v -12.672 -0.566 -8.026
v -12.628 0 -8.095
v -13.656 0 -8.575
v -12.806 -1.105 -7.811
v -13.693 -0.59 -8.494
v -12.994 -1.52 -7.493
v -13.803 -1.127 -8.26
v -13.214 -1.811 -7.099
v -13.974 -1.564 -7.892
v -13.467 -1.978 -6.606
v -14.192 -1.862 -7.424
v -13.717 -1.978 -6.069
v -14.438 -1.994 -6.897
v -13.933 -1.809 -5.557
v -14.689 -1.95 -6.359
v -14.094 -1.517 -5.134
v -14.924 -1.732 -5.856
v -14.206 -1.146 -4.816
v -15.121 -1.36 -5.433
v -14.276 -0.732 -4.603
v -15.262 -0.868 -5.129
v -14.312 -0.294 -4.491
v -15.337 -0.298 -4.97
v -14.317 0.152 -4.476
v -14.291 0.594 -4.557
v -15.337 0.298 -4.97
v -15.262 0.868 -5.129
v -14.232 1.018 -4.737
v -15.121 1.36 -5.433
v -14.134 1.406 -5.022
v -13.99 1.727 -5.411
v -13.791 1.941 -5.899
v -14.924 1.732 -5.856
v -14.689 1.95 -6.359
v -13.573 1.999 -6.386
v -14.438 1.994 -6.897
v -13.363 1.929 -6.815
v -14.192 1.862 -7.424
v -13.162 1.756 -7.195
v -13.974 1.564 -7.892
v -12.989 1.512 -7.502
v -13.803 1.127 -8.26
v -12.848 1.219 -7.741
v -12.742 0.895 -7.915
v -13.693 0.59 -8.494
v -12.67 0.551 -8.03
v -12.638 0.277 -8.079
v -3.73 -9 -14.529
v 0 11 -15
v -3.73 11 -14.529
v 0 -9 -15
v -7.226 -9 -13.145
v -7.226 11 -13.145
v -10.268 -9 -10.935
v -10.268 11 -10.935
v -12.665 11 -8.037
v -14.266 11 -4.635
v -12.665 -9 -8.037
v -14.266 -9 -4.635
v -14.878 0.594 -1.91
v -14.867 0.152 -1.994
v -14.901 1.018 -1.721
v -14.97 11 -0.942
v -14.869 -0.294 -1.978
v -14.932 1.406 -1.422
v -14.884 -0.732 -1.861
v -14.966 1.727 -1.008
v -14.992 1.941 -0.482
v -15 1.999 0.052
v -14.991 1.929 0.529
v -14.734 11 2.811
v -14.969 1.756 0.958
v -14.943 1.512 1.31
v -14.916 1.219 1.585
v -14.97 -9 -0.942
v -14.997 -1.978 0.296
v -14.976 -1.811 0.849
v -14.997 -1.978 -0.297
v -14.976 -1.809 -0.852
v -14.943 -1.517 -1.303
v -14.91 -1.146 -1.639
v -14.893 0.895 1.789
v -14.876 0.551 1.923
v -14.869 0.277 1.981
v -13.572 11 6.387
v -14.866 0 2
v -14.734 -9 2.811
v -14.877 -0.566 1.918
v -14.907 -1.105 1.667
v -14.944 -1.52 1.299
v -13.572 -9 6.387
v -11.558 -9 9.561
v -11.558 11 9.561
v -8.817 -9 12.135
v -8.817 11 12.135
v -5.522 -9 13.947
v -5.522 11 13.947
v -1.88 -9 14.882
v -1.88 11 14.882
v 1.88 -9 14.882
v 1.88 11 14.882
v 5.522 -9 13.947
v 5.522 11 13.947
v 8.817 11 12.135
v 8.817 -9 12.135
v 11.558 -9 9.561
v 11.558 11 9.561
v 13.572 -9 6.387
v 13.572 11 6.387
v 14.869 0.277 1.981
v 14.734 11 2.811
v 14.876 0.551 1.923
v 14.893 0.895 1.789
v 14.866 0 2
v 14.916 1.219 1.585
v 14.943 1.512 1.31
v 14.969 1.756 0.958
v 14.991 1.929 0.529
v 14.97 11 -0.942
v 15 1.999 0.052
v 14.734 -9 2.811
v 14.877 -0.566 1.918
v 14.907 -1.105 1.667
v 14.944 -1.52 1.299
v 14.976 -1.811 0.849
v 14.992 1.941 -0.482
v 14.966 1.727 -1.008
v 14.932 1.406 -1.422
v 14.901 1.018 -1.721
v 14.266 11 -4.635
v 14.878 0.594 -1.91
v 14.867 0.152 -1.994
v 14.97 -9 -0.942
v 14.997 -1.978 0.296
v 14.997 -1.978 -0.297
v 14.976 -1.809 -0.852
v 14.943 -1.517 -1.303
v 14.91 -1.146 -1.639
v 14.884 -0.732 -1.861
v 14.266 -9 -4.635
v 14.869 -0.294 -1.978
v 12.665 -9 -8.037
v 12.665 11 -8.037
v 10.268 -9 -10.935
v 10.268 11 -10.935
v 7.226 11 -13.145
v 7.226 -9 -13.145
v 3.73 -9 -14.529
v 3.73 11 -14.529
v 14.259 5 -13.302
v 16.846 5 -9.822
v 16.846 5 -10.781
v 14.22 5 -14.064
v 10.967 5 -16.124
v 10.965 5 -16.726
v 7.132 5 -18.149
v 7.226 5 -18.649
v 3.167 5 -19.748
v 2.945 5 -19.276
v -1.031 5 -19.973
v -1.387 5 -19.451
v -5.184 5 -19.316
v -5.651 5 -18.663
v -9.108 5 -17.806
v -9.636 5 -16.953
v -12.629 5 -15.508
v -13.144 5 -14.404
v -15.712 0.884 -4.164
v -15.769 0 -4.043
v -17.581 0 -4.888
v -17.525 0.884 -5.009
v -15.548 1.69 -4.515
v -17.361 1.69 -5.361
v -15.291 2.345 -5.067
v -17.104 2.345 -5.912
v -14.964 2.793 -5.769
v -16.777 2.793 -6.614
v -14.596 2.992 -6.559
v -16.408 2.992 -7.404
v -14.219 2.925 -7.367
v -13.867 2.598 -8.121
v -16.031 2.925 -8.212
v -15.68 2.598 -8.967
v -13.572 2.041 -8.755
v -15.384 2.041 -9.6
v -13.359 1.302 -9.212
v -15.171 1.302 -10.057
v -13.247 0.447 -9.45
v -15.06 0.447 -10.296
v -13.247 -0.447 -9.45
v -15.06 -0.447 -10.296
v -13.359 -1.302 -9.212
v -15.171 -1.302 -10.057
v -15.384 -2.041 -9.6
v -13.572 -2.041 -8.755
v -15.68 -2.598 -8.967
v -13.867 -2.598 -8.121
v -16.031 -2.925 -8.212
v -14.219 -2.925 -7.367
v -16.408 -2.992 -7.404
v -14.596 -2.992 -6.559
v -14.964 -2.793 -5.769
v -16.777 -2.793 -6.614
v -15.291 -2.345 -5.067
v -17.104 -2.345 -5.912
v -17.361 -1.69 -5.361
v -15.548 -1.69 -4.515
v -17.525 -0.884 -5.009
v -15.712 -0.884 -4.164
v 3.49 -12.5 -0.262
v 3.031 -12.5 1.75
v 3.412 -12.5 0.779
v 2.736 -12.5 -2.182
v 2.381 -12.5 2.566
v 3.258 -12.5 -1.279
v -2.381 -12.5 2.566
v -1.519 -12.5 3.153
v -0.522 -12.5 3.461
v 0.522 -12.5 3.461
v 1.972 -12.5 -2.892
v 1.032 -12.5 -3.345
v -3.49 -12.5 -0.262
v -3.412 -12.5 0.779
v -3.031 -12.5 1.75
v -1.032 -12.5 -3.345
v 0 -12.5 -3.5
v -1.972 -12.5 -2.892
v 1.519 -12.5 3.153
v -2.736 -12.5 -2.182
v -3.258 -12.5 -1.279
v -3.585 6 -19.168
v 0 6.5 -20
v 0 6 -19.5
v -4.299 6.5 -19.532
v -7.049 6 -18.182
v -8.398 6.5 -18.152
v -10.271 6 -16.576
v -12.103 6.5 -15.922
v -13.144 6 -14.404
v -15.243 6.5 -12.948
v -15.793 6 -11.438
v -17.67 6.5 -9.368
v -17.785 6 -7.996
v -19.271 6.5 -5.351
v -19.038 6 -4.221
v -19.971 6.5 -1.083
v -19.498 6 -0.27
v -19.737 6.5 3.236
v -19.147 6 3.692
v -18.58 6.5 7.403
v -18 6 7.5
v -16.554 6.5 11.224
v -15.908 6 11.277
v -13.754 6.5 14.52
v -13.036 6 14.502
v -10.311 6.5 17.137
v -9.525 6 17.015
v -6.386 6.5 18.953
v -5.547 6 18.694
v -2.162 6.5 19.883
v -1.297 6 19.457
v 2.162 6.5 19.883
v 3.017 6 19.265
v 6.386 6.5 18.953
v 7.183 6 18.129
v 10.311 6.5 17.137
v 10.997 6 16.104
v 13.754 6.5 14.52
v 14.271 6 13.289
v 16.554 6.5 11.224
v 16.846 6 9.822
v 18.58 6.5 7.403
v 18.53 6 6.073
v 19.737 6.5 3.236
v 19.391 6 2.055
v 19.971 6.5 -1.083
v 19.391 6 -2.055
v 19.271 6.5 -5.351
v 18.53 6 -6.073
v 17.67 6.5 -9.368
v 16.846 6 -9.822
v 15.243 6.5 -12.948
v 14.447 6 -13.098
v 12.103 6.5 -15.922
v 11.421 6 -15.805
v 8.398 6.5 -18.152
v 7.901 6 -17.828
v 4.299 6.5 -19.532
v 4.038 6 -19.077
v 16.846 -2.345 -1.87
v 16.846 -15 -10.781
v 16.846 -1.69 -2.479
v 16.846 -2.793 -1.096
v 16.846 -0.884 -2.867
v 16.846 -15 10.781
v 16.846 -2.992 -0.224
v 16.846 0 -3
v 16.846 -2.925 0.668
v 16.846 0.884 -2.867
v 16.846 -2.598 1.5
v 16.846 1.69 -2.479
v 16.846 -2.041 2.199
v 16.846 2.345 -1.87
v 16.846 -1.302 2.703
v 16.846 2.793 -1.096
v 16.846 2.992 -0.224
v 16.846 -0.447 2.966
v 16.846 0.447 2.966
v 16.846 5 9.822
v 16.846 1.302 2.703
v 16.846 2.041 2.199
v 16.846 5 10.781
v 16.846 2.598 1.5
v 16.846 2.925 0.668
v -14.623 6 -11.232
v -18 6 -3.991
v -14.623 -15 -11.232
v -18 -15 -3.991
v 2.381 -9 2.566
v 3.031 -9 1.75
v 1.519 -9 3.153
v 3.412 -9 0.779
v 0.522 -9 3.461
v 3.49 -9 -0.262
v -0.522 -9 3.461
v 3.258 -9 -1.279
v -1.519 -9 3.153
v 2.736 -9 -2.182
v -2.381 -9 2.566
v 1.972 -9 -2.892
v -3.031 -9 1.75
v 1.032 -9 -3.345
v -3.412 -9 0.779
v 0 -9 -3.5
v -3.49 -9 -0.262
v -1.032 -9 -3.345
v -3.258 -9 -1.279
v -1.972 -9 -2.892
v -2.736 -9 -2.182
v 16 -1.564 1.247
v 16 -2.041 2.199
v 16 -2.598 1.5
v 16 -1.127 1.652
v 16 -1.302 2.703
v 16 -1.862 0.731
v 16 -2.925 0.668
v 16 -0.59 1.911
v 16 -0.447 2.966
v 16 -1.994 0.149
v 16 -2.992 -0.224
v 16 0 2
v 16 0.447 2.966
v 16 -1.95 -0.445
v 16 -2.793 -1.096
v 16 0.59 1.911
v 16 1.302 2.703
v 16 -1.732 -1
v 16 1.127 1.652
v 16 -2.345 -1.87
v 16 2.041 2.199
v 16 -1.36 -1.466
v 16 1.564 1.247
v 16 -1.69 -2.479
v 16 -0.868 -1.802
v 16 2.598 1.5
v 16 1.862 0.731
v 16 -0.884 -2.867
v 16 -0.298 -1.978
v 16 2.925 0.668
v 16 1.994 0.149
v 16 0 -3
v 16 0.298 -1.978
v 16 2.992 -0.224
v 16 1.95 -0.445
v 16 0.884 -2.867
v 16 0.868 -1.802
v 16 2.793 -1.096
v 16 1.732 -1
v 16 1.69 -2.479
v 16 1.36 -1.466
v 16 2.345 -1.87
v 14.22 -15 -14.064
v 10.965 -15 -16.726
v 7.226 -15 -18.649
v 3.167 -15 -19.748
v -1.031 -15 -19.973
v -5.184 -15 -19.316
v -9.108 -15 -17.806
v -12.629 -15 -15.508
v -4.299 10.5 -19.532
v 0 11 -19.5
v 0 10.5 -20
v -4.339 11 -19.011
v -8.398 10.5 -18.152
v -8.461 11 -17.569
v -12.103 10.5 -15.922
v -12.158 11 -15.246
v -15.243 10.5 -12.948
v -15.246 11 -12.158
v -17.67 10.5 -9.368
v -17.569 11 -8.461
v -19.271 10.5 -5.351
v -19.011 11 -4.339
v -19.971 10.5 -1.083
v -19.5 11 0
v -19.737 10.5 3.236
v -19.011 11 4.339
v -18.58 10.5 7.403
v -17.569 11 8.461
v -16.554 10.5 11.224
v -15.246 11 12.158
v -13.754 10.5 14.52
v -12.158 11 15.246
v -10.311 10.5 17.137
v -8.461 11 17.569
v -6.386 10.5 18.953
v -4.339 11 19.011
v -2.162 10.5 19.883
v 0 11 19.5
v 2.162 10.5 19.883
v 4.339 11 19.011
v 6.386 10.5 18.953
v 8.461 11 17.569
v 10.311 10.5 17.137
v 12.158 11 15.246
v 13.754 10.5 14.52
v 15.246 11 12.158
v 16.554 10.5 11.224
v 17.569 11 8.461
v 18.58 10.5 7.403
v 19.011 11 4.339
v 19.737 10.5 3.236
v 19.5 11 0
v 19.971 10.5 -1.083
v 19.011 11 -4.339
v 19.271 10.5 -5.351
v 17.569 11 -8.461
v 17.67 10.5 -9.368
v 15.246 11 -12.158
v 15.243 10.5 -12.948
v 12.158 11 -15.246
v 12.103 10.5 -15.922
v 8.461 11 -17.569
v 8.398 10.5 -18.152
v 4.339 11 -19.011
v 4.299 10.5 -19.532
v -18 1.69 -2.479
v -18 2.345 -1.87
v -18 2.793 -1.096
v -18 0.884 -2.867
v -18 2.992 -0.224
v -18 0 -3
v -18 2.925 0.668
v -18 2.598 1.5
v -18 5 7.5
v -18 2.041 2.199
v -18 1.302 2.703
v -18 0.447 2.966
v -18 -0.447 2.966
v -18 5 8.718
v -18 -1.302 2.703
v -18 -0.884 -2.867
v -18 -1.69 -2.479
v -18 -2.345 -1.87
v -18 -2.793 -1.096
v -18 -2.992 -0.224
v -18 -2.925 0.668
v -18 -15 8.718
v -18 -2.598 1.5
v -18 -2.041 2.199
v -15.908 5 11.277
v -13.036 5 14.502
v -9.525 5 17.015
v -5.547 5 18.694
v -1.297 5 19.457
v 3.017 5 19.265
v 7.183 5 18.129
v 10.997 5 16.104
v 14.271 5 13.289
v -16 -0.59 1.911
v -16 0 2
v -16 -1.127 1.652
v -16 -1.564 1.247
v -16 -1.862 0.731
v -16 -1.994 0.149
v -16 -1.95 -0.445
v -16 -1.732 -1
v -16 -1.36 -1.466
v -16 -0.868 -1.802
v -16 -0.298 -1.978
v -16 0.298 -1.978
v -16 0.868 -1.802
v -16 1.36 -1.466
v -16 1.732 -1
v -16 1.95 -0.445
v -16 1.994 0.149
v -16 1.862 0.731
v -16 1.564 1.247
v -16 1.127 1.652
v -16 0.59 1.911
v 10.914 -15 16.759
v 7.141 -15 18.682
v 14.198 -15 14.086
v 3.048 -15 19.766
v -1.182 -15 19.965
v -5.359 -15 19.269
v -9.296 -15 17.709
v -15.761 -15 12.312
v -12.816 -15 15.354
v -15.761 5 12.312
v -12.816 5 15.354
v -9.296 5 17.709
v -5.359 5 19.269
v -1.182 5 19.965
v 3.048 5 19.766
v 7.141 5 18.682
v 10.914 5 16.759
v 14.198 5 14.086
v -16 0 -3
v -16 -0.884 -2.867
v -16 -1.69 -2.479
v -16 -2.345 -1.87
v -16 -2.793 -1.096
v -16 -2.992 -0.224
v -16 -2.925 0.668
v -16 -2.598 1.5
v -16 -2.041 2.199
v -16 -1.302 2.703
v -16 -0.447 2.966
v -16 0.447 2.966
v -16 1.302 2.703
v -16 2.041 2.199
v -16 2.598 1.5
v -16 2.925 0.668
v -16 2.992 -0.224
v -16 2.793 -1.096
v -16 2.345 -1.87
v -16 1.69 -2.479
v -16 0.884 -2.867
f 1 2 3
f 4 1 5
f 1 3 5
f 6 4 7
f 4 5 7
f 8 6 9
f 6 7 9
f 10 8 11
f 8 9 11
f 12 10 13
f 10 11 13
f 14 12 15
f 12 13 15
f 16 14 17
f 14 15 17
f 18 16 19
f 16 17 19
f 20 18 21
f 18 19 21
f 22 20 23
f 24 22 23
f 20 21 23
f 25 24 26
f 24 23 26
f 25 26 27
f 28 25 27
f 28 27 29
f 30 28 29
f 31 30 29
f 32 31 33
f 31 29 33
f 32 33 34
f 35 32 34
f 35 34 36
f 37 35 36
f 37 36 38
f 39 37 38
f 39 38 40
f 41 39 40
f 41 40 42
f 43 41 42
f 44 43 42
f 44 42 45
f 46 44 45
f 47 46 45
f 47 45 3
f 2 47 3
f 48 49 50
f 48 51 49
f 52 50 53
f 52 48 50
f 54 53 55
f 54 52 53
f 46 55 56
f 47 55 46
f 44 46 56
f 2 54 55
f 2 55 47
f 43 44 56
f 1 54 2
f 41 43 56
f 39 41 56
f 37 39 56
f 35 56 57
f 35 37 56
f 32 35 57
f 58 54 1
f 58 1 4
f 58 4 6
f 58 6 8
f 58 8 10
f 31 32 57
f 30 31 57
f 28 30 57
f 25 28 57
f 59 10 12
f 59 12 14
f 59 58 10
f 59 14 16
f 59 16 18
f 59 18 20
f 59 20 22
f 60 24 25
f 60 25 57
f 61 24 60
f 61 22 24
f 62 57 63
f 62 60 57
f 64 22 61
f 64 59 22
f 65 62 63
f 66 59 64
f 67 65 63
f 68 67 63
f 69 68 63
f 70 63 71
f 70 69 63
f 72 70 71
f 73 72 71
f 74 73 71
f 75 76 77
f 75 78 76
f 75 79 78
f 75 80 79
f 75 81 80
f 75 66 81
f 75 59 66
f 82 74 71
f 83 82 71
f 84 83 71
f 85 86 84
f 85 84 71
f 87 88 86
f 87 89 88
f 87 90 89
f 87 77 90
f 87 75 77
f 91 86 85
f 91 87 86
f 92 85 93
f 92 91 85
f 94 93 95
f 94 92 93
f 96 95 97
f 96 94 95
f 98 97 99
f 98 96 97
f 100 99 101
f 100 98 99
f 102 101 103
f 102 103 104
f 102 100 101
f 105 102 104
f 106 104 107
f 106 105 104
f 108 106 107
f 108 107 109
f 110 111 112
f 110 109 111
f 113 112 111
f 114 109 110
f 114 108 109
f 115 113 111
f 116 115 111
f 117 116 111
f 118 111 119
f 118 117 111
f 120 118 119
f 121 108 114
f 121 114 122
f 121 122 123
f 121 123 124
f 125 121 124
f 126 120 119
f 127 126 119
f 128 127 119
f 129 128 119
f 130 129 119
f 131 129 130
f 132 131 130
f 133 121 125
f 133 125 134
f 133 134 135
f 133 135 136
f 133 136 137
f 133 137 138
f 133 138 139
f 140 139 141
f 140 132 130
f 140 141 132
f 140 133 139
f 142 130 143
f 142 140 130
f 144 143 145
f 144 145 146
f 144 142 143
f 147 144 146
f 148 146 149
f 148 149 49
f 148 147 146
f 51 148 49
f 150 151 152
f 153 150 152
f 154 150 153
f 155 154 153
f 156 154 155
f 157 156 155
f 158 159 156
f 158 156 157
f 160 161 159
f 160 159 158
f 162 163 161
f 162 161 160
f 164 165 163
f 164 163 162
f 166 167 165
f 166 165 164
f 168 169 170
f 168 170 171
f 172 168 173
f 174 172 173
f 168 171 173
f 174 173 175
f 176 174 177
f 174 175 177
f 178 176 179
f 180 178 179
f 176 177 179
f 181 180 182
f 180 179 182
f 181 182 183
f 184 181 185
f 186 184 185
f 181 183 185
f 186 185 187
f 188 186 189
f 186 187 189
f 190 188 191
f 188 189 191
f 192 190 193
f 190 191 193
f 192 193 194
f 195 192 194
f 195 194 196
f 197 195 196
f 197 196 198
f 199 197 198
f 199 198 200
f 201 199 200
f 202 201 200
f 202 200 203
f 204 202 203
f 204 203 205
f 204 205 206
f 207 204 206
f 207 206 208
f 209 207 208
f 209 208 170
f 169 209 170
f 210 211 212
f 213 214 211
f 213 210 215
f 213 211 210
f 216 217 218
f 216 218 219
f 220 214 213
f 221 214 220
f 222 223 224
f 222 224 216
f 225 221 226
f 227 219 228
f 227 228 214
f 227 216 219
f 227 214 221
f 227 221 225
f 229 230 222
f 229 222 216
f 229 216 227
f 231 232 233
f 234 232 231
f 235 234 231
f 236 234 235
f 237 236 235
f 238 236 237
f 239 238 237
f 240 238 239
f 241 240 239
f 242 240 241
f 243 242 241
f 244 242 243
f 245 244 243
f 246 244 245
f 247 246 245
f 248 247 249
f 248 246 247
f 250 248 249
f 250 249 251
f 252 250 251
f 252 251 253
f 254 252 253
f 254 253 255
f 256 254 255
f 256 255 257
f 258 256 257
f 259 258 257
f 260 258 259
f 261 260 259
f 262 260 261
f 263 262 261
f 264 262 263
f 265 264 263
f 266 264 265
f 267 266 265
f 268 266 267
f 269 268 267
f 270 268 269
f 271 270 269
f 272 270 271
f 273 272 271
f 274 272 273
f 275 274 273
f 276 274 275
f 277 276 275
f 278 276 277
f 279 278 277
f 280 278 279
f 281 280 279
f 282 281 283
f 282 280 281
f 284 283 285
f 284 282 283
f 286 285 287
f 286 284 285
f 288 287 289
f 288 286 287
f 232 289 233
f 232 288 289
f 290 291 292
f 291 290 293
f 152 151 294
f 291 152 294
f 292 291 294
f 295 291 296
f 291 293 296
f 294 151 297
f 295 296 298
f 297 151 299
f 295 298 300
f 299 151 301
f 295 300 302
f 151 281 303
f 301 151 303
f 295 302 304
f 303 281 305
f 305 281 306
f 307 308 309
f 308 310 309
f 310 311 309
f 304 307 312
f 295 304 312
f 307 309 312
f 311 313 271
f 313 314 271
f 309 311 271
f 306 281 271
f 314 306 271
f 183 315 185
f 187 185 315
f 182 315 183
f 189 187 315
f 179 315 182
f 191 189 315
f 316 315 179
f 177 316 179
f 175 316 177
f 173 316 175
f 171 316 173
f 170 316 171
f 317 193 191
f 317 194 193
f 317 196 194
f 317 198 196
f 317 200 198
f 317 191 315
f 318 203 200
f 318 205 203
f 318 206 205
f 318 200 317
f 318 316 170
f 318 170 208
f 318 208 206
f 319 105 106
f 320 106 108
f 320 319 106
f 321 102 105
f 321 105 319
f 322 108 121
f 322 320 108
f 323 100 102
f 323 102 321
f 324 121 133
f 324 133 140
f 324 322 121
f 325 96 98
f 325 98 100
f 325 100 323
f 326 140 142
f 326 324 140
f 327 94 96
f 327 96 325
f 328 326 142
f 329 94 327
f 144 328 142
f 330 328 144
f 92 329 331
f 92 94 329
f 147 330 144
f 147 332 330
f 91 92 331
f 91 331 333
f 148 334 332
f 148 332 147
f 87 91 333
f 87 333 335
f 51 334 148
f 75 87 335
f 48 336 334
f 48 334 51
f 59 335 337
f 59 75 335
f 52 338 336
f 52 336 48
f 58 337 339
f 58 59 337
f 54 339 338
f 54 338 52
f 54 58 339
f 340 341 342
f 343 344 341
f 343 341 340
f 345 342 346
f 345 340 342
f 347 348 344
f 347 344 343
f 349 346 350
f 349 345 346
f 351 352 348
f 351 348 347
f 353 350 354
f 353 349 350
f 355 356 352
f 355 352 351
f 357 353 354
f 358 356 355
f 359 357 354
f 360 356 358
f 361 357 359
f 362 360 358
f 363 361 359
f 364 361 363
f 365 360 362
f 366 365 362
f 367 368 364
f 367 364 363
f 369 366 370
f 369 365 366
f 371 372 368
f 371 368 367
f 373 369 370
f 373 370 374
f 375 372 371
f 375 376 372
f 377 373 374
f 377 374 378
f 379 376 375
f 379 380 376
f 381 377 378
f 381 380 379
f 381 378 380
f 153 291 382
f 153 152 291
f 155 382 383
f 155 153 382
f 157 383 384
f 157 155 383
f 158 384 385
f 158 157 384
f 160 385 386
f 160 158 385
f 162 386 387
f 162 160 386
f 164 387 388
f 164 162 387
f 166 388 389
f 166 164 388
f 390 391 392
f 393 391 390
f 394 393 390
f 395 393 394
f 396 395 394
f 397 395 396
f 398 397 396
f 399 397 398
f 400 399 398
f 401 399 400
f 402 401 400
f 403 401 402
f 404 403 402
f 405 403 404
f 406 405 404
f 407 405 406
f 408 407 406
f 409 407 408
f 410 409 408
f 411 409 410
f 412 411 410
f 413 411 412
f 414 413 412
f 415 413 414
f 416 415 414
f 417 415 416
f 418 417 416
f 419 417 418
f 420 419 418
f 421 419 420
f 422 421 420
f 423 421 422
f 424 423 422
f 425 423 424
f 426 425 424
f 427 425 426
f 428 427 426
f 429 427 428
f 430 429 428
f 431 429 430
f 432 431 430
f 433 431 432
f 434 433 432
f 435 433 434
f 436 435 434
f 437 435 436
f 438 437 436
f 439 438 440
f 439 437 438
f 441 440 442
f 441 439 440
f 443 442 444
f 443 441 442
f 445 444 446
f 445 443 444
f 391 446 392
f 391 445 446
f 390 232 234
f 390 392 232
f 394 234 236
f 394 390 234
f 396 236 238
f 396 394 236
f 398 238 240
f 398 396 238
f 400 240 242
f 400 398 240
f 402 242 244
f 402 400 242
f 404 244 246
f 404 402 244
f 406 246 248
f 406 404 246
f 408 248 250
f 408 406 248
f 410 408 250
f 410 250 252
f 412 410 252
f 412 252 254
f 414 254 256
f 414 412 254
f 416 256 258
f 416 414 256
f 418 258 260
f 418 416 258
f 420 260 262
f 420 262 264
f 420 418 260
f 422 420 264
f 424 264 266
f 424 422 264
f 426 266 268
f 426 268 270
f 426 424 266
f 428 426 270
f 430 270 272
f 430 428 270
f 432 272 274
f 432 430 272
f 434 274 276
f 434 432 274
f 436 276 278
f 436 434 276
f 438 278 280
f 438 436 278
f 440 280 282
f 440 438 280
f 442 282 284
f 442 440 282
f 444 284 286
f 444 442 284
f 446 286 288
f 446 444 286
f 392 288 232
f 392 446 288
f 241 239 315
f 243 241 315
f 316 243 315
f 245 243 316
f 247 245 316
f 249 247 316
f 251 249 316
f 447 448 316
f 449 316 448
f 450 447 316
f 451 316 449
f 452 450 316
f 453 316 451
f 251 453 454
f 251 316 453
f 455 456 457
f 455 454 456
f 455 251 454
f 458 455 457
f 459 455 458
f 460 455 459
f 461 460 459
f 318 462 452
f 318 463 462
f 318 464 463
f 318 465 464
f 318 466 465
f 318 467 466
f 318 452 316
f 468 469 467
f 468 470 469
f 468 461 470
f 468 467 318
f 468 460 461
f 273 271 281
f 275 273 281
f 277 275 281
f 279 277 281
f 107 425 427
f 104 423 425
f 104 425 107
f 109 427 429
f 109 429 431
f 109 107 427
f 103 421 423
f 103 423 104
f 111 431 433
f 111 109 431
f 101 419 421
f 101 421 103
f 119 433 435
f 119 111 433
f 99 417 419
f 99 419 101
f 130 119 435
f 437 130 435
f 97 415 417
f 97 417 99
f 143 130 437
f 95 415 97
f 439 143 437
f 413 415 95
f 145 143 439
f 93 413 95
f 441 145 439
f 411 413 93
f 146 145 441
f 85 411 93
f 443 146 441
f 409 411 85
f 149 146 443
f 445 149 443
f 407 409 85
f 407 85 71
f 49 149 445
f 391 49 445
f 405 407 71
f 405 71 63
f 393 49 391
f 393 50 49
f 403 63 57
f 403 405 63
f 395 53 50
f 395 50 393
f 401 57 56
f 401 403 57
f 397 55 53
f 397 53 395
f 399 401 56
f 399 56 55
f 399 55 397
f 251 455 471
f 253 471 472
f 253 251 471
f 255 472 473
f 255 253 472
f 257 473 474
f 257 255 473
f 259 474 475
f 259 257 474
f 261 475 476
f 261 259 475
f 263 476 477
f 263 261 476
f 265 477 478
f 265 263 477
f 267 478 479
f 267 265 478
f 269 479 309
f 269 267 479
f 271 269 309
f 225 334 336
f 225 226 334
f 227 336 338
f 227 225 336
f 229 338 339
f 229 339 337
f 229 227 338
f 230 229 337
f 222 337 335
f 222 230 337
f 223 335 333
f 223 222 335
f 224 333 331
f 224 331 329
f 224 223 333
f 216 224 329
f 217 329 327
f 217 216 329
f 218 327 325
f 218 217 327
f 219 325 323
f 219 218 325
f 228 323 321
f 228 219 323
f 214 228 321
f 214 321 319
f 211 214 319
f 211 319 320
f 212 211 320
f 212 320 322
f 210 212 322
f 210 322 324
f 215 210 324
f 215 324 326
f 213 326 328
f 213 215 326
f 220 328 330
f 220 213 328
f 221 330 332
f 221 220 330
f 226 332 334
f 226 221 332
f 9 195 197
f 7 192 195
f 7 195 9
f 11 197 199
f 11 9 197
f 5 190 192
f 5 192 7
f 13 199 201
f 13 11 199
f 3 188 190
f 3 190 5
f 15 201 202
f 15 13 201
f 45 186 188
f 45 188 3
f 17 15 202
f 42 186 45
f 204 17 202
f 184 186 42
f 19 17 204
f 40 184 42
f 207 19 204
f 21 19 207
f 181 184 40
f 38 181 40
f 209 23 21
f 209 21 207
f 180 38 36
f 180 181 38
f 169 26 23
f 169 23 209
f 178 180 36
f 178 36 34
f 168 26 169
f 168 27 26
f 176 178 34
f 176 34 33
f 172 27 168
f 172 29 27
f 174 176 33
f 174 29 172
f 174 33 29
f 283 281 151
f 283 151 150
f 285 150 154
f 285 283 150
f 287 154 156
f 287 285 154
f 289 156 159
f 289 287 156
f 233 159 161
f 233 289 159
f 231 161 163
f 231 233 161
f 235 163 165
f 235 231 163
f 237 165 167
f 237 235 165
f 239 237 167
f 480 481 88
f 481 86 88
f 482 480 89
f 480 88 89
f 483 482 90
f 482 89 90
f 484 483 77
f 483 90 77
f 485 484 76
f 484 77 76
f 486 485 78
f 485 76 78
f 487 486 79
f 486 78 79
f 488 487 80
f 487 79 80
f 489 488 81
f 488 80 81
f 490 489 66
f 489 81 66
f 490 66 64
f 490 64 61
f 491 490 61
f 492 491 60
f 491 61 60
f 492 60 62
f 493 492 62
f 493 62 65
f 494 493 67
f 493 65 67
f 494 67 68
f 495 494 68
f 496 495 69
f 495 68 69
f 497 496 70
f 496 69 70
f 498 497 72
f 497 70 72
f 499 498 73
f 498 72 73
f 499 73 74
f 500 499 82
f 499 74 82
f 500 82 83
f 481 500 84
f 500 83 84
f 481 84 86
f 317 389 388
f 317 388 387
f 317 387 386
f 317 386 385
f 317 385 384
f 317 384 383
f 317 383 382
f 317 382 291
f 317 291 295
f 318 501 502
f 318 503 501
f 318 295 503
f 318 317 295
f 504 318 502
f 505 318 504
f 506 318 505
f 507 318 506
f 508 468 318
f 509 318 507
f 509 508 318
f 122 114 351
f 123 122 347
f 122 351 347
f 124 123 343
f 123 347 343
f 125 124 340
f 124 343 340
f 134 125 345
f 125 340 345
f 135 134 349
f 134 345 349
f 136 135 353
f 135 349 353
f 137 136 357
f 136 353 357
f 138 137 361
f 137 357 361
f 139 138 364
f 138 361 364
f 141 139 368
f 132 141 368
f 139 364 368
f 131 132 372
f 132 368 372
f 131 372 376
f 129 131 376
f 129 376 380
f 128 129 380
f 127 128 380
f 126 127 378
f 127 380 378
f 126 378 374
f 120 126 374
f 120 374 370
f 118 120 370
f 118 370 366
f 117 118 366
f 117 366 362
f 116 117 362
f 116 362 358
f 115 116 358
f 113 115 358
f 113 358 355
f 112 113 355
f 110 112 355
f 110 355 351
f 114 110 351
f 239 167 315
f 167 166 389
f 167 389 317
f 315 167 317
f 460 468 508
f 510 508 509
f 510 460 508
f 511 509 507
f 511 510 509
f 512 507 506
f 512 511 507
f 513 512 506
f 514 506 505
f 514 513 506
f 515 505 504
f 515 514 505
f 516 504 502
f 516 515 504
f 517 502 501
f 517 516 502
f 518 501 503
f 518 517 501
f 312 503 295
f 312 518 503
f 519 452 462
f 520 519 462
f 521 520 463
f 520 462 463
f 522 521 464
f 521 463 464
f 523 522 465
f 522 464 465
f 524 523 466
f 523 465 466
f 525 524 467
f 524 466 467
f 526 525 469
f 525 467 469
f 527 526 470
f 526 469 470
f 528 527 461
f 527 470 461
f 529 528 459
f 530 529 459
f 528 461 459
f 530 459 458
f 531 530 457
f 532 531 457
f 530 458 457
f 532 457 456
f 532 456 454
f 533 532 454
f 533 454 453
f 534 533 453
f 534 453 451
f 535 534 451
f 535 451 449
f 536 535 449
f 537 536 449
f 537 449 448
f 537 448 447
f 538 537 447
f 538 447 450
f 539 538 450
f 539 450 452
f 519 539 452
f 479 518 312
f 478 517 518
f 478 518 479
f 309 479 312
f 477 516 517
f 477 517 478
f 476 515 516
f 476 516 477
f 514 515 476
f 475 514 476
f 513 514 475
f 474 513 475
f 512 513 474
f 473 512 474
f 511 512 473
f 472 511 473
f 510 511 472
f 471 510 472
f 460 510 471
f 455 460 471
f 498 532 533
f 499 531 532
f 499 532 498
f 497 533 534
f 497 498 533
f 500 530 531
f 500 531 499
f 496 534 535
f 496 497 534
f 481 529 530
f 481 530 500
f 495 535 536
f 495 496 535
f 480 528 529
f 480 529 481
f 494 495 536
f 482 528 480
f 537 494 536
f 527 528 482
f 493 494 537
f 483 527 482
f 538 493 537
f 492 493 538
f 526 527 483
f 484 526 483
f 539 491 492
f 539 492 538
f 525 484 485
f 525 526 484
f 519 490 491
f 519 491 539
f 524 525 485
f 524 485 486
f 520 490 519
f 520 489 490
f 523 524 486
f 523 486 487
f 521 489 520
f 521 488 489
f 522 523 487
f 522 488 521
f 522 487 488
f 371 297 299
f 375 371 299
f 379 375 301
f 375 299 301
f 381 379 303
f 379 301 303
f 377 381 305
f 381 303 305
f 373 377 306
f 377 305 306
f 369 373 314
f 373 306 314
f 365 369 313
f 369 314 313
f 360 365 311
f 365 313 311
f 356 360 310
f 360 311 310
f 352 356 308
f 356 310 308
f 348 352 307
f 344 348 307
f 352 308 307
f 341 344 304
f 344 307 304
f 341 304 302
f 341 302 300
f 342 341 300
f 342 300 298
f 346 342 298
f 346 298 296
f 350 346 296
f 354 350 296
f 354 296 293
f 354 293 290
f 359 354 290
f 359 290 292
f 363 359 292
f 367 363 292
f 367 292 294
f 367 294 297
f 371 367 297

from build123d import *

# Parameters (mm, degrees)
FUROS_GUIA_COM_4_0MM2_D            = 4
FUROS_GUIA_COM_4_0MM1_REACH        = 51.881
FUROS_GUIA_COM_4_0MM1_BORE_R       = 2
ESBO_O7_W                          = 18
ESBO_O7_H                          = 6
CORTE_EXTRUS_O4_DEPTH              = 2
ESBO_O11_R                         = 3
REBAIXO_1_DEPTH                    = 2
ESBO_O13_R                         = 3
REBAIXO_2_DEPTH                    = 4
ESBO_O14_W                         = 21
ESBO_O14_H                         = 8
CORTE_EXTRUS_O8_DEPTH              = 2
ESBO_O15_W                         = 21
ESBO_O15_H                         = 8
ESBO_O15_R                         = 3
CORTE_EXTRUS_O13_DEPTH             = 2
CORTE_EXTRUS_O14_START             = -15
CORTE_EXTRUS_O14_DEPTH             = 21
ESBO_O18_R                         = 3
CORTE_EXTRUS_O15_DEPTH             = 4
CORTE_EXTRUS_O16_REACH             = 34.016
CORTE_EXTRUS_O16_DIRECTION_2_DEPTH = 6


with BuildPart() as part:
    # Esbo_o1 → Revolu_o1 (revolve)
    with BuildSketch(Plane.XY, mode=Mode.PRIVATE) as revolu_o1_sk:
        Polygon((0, -15), (20, -15), (20, 5), (19.5, 5), (19.5, 6), (20, 6.5), (20, 10.5), (19.5, 11), (15, 11), (15, -9), (3.5, -9), (3.5, -12.5), (0, -12.5), align=None)
    revolve(revolu_o1_sk.sketch.rotate(Axis((0, 0, 0), (0, 1, 0)), 90), axis=Axis((0, 0, 0), (0, 1, 0)))

    # Furos-guia com _4.0mm2 (through all)
    with Locations(Plane(origin=(-20, 0, 0), x_dir=(0, 0, -1), z_dir=(-1, 0, 0))):
        with Locations((0, 0)):
            Hole(FUROS_GUIA_COM_4_0MM2_D / 2)

    # Furos-guia com _4.0mm1 bore (on position points) → Furos-guia com _4.0mm1 (cut, up to next)
    with BuildSketch(Plane(origin=(-18.126155741, 0, -8.452365235), x_dir=(0.422618261741, 0, -0.906307787037), z_dir=(-0.906307787037, 0, -0.422618261741)), mode=Mode.PRIVATE) as furos_guia_com_4_0mm1_sk1:
        Circle(FUROS_GUIA_COM_4_0MM1_BORE_R)
    furos_guia_com_4_0mm1_tool1 = extrude(furos_guia_com_4_0mm1_sk1.sketch, amount=-FUROS_GUIA_COM_4_0MM1_REACH, mode=Mode.PRIVATE) & part.part
    add(furos_guia_com_4_0mm1_tool1.solids().sort_by_distance((-18.126156, 0, -8.452365))[0], mode=Mode.SUBTRACT)

    # Esbo_o7 → Corte-extrus_o4 (cut)
    with BuildSketch(Plane(origin=(20, 0, 0), x_dir=(0, -1, 0), z_dir=(1, 0, 0))):
        with Locations((6, 0)):
            Rectangle(ESBO_O7_W, ESBO_O7_H)
    extrude(amount=-CORTE_EXTRUS_O4_DEPTH, mode=Mode.SUBTRACT)

    # Esbo_o11 → Rebaixo 1 (cut)
    with BuildSketch(Plane(origin=(18, 0, 0), x_dir=(0, 0, -1), z_dir=(1, 0, 0))):
        Circle(ESBO_O11_R)
    extrude(amount=-REBAIXO_1_DEPTH, mode=Mode.SUBTRACT)

    # Esbo_o13 → Rebaixo 2 (cut)
    with BuildSketch(Plane(origin=(-18.126155741, 0, -8.452365235), x_dir=(0, -1, 0), z_dir=(-0.9063077870366467, 0, -0.4226182617407065))):
        with Locations(Location((0, 0, 0), (0, 0, 90))):
            Circle(ESBO_O13_R)
    extrude(amount=-REBAIXO_2_DEPTH, mode=Mode.SUBTRACT)

    # Esbo_o14 → Corte-extrus_o8 (cut)
    with BuildSketch(Plane(origin=(-18.126155741, 0, -8.452365235), x_dir=(0, -1, 0), z_dir=(-0.9063077870366467, 0, -0.4226182617407065))):
        with Locations((4.5, 0)):
            Rectangle(ESBO_O14_W, ESBO_O14_H)
    extrude(amount=-CORTE_EXTRUS_O8_DEPTH, mode=Mode.SUBTRACT)

    # Esbo_o15 → Corte-extrus_o13 (cut)
    with BuildSketch(Plane(origin=(-20, 0, 0), x_dir=(0, -1, 0), z_dir=(-1, 0, 0))):
        with Locations((4.5, 0)):
            Rectangle(ESBO_O15_W, ESBO_O15_H)
        with Locations(Location((0, 0, 0), (0, 0, 270))):
            Circle(ESBO_O15_R, mode=Mode.SUBTRACT)
    extrude(amount=-CORTE_EXTRUS_O13_DEPTH, mode=Mode.SUBTRACT)

    # Esbo_o17 → Corte-extrus_o14 (cut)
    with BuildSketch(Plane(origin=(0, 0, 0), x_dir=(1, 0, 0), z_dir=(0, 1, 0)).offset(CORTE_EXTRUS_O14_START)):
        with BuildLine():
            Line((-18, 3.990503928), (-18, -8.717797887))
            ThreePointArc((-18, -8.717797887), (-19.525920142, 4.328792279), (-12.629239577, 15.508136822))
            Line((-12.629239577, 15.508136822), (-18, 3.990503928))
        make_face()
    extrude(amount=CORTE_EXTRUS_O14_DEPTH, mode=Mode.SUBTRACT)

    # Esbo_o18 → Corte-extrus_o15 (cut)
    with BuildSketch(Plane(origin=(-20, 0, 0), x_dir=(0, -1, 0), z_dir=(-1, 0, 0))):
        with Locations(Location((0, 0, 0), (0, 0, 270))):
            Circle(ESBO_O18_R)
    extrude(amount=-CORTE_EXTRUS_O15_DEPTH, mode=Mode.SUBTRACT)

    # Esbo_o9 → Corte-extrus_o16 (cut, up to next)
    with BuildSketch(Plane(origin=(0, 0, 0), x_dir=(1, 0, 0), z_dir=(0, 1, 0)), mode=Mode.PRIVATE) as corte_extrus_o16_sk1:
        with BuildLine():
            Line((16.845642244, 10.780739186), (16.845642244, -10.780739186))
            ThreePointArc((16.845642244, -10.780739186), (20, 0), (16.845642244, 10.780739186))
        make_face()
    corte_extrus_o16_tool1 = extrude(corte_extrus_o16_sk1.sketch, amount=-CORTE_EXTRUS_O16_REACH, mode=Mode.PRIVATE) & part.part
    add(corte_extrus_o16_tool1.solids().sort_by_distance((18.116323, 0, 0))[0], mode=Mode.SUBTRACT)

    # Esbo_o9 → Corte-extrus_o16 direction 2 (cut)
    with BuildSketch(Plane(origin=(0, 0, 0), x_dir=(1, 0, 0), z_dir=(0, 1, 0))):
        with BuildLine():
            Line((16.845642244, 10.780739186), (16.845642244, -10.780739186))
            ThreePointArc((16.845642244, -10.780739186), (20, 0), (16.845642244, 10.780739186))
        make_face()
    extrude(amount=CORTE_EXTRUS_O16_DIRECTION_2_DEPTH, mode=Mode.SUBTRACT)


solid = part.part
